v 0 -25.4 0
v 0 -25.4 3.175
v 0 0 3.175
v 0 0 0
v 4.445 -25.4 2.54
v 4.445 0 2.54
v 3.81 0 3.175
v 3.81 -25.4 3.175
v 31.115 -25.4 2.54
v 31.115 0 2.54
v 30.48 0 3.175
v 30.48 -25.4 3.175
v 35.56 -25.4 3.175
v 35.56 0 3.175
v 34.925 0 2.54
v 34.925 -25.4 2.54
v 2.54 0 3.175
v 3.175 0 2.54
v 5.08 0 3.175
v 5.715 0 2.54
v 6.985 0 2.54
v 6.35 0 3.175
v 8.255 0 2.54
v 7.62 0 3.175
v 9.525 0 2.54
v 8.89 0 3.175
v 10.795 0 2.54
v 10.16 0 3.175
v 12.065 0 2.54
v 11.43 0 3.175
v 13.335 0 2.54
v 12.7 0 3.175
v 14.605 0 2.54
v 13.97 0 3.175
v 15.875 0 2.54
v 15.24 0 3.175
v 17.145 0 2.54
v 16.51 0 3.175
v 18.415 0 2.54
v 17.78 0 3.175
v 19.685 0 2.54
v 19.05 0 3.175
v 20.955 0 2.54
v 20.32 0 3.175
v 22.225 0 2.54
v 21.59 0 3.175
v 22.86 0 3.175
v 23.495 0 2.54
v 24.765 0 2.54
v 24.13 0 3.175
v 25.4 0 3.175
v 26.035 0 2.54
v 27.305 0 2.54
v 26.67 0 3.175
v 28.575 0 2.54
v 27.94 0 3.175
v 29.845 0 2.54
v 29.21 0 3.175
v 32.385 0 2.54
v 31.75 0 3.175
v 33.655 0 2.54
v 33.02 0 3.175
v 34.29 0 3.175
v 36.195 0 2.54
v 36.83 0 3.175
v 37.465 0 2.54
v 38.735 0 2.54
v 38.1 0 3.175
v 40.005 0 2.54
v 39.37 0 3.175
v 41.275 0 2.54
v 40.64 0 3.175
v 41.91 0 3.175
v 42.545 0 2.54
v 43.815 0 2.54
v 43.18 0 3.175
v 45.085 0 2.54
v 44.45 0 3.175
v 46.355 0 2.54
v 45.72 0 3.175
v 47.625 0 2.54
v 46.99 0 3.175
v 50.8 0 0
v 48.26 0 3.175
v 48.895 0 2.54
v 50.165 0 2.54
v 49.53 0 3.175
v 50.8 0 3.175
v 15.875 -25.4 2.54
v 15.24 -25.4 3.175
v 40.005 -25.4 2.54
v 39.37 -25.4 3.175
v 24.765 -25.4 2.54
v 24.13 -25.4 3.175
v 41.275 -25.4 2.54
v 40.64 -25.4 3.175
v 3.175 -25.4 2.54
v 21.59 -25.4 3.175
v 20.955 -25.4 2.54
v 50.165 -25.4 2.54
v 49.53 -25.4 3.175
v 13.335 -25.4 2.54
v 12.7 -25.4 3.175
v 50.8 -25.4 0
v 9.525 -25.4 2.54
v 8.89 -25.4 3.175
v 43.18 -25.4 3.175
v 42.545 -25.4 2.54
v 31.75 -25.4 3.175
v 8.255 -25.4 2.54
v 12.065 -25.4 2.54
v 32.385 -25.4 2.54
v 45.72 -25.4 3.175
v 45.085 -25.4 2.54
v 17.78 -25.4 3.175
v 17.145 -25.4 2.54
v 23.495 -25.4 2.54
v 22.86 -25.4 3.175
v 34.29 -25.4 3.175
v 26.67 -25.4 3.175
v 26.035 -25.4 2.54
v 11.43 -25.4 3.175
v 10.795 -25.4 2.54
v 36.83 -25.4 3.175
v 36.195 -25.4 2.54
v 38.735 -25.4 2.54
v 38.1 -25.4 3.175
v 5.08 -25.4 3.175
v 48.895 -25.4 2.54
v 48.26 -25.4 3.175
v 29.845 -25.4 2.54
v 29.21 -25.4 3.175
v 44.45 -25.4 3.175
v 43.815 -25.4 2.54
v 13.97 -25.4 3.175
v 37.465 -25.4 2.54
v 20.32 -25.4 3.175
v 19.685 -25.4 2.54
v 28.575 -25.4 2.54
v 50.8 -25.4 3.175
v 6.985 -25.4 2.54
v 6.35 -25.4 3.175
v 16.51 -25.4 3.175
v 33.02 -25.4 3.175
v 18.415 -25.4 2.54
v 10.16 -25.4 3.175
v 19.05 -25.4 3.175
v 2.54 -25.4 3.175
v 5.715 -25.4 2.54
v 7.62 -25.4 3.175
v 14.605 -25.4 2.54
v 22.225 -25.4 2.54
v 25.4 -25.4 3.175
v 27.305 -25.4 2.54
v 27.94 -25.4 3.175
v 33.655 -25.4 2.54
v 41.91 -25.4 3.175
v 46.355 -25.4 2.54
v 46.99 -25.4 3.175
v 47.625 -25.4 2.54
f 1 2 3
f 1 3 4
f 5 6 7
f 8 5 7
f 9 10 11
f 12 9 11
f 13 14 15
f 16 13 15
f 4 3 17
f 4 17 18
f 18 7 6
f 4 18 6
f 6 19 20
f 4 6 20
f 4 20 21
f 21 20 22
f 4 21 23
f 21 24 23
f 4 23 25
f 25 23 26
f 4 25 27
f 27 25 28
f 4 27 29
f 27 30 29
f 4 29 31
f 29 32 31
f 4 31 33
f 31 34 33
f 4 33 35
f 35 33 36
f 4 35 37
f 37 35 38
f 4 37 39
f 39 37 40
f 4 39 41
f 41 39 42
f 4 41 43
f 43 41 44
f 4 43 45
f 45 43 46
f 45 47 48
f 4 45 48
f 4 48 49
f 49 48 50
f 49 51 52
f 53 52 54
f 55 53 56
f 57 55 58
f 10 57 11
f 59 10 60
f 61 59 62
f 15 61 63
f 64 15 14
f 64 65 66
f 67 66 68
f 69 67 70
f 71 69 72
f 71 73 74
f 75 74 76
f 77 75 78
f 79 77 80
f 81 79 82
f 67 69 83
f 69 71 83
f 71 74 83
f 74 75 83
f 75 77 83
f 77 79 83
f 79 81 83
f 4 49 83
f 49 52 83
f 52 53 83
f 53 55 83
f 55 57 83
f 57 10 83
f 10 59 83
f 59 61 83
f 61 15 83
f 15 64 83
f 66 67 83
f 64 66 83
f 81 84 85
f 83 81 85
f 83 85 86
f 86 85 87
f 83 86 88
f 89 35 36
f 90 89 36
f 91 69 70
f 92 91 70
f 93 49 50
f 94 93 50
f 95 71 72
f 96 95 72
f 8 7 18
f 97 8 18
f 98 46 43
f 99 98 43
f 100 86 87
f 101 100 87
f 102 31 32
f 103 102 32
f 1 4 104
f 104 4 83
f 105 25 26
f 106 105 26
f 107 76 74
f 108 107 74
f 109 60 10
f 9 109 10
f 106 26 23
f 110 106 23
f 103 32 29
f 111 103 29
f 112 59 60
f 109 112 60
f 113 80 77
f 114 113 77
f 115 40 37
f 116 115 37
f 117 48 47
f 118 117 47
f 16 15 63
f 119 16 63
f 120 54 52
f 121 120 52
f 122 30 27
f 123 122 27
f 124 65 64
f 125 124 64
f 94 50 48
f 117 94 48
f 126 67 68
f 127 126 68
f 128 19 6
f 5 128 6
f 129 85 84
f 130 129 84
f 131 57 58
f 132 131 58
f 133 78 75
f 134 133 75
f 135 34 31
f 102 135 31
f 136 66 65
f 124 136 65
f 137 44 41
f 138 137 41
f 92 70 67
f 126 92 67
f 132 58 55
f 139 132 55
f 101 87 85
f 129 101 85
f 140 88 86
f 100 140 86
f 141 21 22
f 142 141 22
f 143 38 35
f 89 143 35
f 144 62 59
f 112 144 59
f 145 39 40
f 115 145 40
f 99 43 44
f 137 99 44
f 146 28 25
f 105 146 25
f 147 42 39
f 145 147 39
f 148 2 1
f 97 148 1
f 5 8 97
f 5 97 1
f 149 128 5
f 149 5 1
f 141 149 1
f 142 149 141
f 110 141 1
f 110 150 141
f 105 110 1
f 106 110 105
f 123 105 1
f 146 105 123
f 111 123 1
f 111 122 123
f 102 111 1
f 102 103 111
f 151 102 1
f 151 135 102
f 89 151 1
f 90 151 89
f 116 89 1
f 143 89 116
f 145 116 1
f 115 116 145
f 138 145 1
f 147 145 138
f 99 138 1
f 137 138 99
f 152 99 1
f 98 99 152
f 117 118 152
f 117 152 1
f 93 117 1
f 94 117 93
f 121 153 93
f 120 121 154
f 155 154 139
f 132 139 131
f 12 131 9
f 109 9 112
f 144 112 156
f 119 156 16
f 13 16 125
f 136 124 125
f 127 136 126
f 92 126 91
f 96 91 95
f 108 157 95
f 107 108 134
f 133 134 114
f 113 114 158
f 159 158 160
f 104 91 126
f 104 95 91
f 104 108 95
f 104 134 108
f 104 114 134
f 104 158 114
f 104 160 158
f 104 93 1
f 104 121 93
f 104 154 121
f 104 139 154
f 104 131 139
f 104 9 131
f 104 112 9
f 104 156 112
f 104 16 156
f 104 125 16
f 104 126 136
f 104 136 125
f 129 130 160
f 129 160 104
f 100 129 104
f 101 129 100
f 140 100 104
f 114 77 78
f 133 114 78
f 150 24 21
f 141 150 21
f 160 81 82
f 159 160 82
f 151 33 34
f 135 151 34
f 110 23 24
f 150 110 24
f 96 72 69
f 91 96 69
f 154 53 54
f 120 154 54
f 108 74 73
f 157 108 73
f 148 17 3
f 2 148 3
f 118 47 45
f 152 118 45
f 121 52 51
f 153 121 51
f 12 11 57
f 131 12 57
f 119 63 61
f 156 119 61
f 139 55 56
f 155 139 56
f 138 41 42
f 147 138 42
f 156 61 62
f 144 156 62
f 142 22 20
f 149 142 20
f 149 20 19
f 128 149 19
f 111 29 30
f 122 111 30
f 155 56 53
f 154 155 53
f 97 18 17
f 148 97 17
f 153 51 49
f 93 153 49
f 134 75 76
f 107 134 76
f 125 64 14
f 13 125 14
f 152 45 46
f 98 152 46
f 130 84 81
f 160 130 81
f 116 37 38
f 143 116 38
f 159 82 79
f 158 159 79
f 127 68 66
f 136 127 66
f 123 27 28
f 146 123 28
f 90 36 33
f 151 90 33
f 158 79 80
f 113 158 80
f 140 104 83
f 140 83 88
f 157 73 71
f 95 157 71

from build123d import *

# Parameters (mm, degrees)
F1_DEPTH = 25.4


with BuildPart() as f1:
    # F0 (on Front) → F1 (new body)
    with BuildSketch(Plane.XZ):
        Polygon((0, 3.175), (0, 0), (50.8, 0), (50.8, 3.175), (50.165, 2.54), (49.53, 3.175), (48.895, 2.54), (48.26, 3.175), (47.625, 2.54), (46.99, 3.175), (46.355, 2.54), (45.72, 3.175), (45.085, 2.54), (44.45, 3.175), (43.815, 2.54), (43.18, 3.175), (42.545, 2.54), (41.91, 3.175), (41.275, 2.54), (40.64, 3.175), (40.005, 2.54), (39.37, 3.175), (38.735, 2.54), (38.1, 3.175), (37.465, 2.54), (36.83, 3.175), (36.195, 2.54), (35.56, 3.175), (34.925, 2.54), (34.29, 3.175), (33.655, 2.54), (33.02, 3.175), (32.385, 2.54), (31.75, 3.175), (31.115, 2.54), (30.48, 3.175), (29.845, 2.54), (29.21, 3.175), (28.575, 2.54), (27.94, 3.175), (27.305, 2.54), (26.67, 3.175), (26.035, 2.54), (25.4, 3.175), (24.765, 2.54), (24.13, 3.175), (23.495, 2.54), (22.86, 3.175), (22.225, 2.54), (21.59, 3.175), (20.955, 2.54), (20.32, 3.175), (19.685, 2.54), (19.05, 3.175), (18.415, 2.54), (17.78, 3.175), (17.145, 2.54), (16.51, 3.175), (15.875, 2.54), (15.24, 3.175), (14.605, 2.54), (13.97, 3.175), (13.335, 2.54), (12.7, 3.175), (12.065, 2.54), (11.43, 3.175), (10.795, 2.54), (10.16, 3.175), (9.525, 2.54), (8.89, 3.175), (8.255, 2.54), (7.62, 3.175), (6.985, 2.54), (6.35, 3.175), (5.715, 2.54), (5.08, 3.175), (4.445, 2.54), (3.81, 3.175), (3.175, 2.54), (2.54, 3.175), align=None)
    extrude(amount=F1_DEPTH)


solid = f1.part
